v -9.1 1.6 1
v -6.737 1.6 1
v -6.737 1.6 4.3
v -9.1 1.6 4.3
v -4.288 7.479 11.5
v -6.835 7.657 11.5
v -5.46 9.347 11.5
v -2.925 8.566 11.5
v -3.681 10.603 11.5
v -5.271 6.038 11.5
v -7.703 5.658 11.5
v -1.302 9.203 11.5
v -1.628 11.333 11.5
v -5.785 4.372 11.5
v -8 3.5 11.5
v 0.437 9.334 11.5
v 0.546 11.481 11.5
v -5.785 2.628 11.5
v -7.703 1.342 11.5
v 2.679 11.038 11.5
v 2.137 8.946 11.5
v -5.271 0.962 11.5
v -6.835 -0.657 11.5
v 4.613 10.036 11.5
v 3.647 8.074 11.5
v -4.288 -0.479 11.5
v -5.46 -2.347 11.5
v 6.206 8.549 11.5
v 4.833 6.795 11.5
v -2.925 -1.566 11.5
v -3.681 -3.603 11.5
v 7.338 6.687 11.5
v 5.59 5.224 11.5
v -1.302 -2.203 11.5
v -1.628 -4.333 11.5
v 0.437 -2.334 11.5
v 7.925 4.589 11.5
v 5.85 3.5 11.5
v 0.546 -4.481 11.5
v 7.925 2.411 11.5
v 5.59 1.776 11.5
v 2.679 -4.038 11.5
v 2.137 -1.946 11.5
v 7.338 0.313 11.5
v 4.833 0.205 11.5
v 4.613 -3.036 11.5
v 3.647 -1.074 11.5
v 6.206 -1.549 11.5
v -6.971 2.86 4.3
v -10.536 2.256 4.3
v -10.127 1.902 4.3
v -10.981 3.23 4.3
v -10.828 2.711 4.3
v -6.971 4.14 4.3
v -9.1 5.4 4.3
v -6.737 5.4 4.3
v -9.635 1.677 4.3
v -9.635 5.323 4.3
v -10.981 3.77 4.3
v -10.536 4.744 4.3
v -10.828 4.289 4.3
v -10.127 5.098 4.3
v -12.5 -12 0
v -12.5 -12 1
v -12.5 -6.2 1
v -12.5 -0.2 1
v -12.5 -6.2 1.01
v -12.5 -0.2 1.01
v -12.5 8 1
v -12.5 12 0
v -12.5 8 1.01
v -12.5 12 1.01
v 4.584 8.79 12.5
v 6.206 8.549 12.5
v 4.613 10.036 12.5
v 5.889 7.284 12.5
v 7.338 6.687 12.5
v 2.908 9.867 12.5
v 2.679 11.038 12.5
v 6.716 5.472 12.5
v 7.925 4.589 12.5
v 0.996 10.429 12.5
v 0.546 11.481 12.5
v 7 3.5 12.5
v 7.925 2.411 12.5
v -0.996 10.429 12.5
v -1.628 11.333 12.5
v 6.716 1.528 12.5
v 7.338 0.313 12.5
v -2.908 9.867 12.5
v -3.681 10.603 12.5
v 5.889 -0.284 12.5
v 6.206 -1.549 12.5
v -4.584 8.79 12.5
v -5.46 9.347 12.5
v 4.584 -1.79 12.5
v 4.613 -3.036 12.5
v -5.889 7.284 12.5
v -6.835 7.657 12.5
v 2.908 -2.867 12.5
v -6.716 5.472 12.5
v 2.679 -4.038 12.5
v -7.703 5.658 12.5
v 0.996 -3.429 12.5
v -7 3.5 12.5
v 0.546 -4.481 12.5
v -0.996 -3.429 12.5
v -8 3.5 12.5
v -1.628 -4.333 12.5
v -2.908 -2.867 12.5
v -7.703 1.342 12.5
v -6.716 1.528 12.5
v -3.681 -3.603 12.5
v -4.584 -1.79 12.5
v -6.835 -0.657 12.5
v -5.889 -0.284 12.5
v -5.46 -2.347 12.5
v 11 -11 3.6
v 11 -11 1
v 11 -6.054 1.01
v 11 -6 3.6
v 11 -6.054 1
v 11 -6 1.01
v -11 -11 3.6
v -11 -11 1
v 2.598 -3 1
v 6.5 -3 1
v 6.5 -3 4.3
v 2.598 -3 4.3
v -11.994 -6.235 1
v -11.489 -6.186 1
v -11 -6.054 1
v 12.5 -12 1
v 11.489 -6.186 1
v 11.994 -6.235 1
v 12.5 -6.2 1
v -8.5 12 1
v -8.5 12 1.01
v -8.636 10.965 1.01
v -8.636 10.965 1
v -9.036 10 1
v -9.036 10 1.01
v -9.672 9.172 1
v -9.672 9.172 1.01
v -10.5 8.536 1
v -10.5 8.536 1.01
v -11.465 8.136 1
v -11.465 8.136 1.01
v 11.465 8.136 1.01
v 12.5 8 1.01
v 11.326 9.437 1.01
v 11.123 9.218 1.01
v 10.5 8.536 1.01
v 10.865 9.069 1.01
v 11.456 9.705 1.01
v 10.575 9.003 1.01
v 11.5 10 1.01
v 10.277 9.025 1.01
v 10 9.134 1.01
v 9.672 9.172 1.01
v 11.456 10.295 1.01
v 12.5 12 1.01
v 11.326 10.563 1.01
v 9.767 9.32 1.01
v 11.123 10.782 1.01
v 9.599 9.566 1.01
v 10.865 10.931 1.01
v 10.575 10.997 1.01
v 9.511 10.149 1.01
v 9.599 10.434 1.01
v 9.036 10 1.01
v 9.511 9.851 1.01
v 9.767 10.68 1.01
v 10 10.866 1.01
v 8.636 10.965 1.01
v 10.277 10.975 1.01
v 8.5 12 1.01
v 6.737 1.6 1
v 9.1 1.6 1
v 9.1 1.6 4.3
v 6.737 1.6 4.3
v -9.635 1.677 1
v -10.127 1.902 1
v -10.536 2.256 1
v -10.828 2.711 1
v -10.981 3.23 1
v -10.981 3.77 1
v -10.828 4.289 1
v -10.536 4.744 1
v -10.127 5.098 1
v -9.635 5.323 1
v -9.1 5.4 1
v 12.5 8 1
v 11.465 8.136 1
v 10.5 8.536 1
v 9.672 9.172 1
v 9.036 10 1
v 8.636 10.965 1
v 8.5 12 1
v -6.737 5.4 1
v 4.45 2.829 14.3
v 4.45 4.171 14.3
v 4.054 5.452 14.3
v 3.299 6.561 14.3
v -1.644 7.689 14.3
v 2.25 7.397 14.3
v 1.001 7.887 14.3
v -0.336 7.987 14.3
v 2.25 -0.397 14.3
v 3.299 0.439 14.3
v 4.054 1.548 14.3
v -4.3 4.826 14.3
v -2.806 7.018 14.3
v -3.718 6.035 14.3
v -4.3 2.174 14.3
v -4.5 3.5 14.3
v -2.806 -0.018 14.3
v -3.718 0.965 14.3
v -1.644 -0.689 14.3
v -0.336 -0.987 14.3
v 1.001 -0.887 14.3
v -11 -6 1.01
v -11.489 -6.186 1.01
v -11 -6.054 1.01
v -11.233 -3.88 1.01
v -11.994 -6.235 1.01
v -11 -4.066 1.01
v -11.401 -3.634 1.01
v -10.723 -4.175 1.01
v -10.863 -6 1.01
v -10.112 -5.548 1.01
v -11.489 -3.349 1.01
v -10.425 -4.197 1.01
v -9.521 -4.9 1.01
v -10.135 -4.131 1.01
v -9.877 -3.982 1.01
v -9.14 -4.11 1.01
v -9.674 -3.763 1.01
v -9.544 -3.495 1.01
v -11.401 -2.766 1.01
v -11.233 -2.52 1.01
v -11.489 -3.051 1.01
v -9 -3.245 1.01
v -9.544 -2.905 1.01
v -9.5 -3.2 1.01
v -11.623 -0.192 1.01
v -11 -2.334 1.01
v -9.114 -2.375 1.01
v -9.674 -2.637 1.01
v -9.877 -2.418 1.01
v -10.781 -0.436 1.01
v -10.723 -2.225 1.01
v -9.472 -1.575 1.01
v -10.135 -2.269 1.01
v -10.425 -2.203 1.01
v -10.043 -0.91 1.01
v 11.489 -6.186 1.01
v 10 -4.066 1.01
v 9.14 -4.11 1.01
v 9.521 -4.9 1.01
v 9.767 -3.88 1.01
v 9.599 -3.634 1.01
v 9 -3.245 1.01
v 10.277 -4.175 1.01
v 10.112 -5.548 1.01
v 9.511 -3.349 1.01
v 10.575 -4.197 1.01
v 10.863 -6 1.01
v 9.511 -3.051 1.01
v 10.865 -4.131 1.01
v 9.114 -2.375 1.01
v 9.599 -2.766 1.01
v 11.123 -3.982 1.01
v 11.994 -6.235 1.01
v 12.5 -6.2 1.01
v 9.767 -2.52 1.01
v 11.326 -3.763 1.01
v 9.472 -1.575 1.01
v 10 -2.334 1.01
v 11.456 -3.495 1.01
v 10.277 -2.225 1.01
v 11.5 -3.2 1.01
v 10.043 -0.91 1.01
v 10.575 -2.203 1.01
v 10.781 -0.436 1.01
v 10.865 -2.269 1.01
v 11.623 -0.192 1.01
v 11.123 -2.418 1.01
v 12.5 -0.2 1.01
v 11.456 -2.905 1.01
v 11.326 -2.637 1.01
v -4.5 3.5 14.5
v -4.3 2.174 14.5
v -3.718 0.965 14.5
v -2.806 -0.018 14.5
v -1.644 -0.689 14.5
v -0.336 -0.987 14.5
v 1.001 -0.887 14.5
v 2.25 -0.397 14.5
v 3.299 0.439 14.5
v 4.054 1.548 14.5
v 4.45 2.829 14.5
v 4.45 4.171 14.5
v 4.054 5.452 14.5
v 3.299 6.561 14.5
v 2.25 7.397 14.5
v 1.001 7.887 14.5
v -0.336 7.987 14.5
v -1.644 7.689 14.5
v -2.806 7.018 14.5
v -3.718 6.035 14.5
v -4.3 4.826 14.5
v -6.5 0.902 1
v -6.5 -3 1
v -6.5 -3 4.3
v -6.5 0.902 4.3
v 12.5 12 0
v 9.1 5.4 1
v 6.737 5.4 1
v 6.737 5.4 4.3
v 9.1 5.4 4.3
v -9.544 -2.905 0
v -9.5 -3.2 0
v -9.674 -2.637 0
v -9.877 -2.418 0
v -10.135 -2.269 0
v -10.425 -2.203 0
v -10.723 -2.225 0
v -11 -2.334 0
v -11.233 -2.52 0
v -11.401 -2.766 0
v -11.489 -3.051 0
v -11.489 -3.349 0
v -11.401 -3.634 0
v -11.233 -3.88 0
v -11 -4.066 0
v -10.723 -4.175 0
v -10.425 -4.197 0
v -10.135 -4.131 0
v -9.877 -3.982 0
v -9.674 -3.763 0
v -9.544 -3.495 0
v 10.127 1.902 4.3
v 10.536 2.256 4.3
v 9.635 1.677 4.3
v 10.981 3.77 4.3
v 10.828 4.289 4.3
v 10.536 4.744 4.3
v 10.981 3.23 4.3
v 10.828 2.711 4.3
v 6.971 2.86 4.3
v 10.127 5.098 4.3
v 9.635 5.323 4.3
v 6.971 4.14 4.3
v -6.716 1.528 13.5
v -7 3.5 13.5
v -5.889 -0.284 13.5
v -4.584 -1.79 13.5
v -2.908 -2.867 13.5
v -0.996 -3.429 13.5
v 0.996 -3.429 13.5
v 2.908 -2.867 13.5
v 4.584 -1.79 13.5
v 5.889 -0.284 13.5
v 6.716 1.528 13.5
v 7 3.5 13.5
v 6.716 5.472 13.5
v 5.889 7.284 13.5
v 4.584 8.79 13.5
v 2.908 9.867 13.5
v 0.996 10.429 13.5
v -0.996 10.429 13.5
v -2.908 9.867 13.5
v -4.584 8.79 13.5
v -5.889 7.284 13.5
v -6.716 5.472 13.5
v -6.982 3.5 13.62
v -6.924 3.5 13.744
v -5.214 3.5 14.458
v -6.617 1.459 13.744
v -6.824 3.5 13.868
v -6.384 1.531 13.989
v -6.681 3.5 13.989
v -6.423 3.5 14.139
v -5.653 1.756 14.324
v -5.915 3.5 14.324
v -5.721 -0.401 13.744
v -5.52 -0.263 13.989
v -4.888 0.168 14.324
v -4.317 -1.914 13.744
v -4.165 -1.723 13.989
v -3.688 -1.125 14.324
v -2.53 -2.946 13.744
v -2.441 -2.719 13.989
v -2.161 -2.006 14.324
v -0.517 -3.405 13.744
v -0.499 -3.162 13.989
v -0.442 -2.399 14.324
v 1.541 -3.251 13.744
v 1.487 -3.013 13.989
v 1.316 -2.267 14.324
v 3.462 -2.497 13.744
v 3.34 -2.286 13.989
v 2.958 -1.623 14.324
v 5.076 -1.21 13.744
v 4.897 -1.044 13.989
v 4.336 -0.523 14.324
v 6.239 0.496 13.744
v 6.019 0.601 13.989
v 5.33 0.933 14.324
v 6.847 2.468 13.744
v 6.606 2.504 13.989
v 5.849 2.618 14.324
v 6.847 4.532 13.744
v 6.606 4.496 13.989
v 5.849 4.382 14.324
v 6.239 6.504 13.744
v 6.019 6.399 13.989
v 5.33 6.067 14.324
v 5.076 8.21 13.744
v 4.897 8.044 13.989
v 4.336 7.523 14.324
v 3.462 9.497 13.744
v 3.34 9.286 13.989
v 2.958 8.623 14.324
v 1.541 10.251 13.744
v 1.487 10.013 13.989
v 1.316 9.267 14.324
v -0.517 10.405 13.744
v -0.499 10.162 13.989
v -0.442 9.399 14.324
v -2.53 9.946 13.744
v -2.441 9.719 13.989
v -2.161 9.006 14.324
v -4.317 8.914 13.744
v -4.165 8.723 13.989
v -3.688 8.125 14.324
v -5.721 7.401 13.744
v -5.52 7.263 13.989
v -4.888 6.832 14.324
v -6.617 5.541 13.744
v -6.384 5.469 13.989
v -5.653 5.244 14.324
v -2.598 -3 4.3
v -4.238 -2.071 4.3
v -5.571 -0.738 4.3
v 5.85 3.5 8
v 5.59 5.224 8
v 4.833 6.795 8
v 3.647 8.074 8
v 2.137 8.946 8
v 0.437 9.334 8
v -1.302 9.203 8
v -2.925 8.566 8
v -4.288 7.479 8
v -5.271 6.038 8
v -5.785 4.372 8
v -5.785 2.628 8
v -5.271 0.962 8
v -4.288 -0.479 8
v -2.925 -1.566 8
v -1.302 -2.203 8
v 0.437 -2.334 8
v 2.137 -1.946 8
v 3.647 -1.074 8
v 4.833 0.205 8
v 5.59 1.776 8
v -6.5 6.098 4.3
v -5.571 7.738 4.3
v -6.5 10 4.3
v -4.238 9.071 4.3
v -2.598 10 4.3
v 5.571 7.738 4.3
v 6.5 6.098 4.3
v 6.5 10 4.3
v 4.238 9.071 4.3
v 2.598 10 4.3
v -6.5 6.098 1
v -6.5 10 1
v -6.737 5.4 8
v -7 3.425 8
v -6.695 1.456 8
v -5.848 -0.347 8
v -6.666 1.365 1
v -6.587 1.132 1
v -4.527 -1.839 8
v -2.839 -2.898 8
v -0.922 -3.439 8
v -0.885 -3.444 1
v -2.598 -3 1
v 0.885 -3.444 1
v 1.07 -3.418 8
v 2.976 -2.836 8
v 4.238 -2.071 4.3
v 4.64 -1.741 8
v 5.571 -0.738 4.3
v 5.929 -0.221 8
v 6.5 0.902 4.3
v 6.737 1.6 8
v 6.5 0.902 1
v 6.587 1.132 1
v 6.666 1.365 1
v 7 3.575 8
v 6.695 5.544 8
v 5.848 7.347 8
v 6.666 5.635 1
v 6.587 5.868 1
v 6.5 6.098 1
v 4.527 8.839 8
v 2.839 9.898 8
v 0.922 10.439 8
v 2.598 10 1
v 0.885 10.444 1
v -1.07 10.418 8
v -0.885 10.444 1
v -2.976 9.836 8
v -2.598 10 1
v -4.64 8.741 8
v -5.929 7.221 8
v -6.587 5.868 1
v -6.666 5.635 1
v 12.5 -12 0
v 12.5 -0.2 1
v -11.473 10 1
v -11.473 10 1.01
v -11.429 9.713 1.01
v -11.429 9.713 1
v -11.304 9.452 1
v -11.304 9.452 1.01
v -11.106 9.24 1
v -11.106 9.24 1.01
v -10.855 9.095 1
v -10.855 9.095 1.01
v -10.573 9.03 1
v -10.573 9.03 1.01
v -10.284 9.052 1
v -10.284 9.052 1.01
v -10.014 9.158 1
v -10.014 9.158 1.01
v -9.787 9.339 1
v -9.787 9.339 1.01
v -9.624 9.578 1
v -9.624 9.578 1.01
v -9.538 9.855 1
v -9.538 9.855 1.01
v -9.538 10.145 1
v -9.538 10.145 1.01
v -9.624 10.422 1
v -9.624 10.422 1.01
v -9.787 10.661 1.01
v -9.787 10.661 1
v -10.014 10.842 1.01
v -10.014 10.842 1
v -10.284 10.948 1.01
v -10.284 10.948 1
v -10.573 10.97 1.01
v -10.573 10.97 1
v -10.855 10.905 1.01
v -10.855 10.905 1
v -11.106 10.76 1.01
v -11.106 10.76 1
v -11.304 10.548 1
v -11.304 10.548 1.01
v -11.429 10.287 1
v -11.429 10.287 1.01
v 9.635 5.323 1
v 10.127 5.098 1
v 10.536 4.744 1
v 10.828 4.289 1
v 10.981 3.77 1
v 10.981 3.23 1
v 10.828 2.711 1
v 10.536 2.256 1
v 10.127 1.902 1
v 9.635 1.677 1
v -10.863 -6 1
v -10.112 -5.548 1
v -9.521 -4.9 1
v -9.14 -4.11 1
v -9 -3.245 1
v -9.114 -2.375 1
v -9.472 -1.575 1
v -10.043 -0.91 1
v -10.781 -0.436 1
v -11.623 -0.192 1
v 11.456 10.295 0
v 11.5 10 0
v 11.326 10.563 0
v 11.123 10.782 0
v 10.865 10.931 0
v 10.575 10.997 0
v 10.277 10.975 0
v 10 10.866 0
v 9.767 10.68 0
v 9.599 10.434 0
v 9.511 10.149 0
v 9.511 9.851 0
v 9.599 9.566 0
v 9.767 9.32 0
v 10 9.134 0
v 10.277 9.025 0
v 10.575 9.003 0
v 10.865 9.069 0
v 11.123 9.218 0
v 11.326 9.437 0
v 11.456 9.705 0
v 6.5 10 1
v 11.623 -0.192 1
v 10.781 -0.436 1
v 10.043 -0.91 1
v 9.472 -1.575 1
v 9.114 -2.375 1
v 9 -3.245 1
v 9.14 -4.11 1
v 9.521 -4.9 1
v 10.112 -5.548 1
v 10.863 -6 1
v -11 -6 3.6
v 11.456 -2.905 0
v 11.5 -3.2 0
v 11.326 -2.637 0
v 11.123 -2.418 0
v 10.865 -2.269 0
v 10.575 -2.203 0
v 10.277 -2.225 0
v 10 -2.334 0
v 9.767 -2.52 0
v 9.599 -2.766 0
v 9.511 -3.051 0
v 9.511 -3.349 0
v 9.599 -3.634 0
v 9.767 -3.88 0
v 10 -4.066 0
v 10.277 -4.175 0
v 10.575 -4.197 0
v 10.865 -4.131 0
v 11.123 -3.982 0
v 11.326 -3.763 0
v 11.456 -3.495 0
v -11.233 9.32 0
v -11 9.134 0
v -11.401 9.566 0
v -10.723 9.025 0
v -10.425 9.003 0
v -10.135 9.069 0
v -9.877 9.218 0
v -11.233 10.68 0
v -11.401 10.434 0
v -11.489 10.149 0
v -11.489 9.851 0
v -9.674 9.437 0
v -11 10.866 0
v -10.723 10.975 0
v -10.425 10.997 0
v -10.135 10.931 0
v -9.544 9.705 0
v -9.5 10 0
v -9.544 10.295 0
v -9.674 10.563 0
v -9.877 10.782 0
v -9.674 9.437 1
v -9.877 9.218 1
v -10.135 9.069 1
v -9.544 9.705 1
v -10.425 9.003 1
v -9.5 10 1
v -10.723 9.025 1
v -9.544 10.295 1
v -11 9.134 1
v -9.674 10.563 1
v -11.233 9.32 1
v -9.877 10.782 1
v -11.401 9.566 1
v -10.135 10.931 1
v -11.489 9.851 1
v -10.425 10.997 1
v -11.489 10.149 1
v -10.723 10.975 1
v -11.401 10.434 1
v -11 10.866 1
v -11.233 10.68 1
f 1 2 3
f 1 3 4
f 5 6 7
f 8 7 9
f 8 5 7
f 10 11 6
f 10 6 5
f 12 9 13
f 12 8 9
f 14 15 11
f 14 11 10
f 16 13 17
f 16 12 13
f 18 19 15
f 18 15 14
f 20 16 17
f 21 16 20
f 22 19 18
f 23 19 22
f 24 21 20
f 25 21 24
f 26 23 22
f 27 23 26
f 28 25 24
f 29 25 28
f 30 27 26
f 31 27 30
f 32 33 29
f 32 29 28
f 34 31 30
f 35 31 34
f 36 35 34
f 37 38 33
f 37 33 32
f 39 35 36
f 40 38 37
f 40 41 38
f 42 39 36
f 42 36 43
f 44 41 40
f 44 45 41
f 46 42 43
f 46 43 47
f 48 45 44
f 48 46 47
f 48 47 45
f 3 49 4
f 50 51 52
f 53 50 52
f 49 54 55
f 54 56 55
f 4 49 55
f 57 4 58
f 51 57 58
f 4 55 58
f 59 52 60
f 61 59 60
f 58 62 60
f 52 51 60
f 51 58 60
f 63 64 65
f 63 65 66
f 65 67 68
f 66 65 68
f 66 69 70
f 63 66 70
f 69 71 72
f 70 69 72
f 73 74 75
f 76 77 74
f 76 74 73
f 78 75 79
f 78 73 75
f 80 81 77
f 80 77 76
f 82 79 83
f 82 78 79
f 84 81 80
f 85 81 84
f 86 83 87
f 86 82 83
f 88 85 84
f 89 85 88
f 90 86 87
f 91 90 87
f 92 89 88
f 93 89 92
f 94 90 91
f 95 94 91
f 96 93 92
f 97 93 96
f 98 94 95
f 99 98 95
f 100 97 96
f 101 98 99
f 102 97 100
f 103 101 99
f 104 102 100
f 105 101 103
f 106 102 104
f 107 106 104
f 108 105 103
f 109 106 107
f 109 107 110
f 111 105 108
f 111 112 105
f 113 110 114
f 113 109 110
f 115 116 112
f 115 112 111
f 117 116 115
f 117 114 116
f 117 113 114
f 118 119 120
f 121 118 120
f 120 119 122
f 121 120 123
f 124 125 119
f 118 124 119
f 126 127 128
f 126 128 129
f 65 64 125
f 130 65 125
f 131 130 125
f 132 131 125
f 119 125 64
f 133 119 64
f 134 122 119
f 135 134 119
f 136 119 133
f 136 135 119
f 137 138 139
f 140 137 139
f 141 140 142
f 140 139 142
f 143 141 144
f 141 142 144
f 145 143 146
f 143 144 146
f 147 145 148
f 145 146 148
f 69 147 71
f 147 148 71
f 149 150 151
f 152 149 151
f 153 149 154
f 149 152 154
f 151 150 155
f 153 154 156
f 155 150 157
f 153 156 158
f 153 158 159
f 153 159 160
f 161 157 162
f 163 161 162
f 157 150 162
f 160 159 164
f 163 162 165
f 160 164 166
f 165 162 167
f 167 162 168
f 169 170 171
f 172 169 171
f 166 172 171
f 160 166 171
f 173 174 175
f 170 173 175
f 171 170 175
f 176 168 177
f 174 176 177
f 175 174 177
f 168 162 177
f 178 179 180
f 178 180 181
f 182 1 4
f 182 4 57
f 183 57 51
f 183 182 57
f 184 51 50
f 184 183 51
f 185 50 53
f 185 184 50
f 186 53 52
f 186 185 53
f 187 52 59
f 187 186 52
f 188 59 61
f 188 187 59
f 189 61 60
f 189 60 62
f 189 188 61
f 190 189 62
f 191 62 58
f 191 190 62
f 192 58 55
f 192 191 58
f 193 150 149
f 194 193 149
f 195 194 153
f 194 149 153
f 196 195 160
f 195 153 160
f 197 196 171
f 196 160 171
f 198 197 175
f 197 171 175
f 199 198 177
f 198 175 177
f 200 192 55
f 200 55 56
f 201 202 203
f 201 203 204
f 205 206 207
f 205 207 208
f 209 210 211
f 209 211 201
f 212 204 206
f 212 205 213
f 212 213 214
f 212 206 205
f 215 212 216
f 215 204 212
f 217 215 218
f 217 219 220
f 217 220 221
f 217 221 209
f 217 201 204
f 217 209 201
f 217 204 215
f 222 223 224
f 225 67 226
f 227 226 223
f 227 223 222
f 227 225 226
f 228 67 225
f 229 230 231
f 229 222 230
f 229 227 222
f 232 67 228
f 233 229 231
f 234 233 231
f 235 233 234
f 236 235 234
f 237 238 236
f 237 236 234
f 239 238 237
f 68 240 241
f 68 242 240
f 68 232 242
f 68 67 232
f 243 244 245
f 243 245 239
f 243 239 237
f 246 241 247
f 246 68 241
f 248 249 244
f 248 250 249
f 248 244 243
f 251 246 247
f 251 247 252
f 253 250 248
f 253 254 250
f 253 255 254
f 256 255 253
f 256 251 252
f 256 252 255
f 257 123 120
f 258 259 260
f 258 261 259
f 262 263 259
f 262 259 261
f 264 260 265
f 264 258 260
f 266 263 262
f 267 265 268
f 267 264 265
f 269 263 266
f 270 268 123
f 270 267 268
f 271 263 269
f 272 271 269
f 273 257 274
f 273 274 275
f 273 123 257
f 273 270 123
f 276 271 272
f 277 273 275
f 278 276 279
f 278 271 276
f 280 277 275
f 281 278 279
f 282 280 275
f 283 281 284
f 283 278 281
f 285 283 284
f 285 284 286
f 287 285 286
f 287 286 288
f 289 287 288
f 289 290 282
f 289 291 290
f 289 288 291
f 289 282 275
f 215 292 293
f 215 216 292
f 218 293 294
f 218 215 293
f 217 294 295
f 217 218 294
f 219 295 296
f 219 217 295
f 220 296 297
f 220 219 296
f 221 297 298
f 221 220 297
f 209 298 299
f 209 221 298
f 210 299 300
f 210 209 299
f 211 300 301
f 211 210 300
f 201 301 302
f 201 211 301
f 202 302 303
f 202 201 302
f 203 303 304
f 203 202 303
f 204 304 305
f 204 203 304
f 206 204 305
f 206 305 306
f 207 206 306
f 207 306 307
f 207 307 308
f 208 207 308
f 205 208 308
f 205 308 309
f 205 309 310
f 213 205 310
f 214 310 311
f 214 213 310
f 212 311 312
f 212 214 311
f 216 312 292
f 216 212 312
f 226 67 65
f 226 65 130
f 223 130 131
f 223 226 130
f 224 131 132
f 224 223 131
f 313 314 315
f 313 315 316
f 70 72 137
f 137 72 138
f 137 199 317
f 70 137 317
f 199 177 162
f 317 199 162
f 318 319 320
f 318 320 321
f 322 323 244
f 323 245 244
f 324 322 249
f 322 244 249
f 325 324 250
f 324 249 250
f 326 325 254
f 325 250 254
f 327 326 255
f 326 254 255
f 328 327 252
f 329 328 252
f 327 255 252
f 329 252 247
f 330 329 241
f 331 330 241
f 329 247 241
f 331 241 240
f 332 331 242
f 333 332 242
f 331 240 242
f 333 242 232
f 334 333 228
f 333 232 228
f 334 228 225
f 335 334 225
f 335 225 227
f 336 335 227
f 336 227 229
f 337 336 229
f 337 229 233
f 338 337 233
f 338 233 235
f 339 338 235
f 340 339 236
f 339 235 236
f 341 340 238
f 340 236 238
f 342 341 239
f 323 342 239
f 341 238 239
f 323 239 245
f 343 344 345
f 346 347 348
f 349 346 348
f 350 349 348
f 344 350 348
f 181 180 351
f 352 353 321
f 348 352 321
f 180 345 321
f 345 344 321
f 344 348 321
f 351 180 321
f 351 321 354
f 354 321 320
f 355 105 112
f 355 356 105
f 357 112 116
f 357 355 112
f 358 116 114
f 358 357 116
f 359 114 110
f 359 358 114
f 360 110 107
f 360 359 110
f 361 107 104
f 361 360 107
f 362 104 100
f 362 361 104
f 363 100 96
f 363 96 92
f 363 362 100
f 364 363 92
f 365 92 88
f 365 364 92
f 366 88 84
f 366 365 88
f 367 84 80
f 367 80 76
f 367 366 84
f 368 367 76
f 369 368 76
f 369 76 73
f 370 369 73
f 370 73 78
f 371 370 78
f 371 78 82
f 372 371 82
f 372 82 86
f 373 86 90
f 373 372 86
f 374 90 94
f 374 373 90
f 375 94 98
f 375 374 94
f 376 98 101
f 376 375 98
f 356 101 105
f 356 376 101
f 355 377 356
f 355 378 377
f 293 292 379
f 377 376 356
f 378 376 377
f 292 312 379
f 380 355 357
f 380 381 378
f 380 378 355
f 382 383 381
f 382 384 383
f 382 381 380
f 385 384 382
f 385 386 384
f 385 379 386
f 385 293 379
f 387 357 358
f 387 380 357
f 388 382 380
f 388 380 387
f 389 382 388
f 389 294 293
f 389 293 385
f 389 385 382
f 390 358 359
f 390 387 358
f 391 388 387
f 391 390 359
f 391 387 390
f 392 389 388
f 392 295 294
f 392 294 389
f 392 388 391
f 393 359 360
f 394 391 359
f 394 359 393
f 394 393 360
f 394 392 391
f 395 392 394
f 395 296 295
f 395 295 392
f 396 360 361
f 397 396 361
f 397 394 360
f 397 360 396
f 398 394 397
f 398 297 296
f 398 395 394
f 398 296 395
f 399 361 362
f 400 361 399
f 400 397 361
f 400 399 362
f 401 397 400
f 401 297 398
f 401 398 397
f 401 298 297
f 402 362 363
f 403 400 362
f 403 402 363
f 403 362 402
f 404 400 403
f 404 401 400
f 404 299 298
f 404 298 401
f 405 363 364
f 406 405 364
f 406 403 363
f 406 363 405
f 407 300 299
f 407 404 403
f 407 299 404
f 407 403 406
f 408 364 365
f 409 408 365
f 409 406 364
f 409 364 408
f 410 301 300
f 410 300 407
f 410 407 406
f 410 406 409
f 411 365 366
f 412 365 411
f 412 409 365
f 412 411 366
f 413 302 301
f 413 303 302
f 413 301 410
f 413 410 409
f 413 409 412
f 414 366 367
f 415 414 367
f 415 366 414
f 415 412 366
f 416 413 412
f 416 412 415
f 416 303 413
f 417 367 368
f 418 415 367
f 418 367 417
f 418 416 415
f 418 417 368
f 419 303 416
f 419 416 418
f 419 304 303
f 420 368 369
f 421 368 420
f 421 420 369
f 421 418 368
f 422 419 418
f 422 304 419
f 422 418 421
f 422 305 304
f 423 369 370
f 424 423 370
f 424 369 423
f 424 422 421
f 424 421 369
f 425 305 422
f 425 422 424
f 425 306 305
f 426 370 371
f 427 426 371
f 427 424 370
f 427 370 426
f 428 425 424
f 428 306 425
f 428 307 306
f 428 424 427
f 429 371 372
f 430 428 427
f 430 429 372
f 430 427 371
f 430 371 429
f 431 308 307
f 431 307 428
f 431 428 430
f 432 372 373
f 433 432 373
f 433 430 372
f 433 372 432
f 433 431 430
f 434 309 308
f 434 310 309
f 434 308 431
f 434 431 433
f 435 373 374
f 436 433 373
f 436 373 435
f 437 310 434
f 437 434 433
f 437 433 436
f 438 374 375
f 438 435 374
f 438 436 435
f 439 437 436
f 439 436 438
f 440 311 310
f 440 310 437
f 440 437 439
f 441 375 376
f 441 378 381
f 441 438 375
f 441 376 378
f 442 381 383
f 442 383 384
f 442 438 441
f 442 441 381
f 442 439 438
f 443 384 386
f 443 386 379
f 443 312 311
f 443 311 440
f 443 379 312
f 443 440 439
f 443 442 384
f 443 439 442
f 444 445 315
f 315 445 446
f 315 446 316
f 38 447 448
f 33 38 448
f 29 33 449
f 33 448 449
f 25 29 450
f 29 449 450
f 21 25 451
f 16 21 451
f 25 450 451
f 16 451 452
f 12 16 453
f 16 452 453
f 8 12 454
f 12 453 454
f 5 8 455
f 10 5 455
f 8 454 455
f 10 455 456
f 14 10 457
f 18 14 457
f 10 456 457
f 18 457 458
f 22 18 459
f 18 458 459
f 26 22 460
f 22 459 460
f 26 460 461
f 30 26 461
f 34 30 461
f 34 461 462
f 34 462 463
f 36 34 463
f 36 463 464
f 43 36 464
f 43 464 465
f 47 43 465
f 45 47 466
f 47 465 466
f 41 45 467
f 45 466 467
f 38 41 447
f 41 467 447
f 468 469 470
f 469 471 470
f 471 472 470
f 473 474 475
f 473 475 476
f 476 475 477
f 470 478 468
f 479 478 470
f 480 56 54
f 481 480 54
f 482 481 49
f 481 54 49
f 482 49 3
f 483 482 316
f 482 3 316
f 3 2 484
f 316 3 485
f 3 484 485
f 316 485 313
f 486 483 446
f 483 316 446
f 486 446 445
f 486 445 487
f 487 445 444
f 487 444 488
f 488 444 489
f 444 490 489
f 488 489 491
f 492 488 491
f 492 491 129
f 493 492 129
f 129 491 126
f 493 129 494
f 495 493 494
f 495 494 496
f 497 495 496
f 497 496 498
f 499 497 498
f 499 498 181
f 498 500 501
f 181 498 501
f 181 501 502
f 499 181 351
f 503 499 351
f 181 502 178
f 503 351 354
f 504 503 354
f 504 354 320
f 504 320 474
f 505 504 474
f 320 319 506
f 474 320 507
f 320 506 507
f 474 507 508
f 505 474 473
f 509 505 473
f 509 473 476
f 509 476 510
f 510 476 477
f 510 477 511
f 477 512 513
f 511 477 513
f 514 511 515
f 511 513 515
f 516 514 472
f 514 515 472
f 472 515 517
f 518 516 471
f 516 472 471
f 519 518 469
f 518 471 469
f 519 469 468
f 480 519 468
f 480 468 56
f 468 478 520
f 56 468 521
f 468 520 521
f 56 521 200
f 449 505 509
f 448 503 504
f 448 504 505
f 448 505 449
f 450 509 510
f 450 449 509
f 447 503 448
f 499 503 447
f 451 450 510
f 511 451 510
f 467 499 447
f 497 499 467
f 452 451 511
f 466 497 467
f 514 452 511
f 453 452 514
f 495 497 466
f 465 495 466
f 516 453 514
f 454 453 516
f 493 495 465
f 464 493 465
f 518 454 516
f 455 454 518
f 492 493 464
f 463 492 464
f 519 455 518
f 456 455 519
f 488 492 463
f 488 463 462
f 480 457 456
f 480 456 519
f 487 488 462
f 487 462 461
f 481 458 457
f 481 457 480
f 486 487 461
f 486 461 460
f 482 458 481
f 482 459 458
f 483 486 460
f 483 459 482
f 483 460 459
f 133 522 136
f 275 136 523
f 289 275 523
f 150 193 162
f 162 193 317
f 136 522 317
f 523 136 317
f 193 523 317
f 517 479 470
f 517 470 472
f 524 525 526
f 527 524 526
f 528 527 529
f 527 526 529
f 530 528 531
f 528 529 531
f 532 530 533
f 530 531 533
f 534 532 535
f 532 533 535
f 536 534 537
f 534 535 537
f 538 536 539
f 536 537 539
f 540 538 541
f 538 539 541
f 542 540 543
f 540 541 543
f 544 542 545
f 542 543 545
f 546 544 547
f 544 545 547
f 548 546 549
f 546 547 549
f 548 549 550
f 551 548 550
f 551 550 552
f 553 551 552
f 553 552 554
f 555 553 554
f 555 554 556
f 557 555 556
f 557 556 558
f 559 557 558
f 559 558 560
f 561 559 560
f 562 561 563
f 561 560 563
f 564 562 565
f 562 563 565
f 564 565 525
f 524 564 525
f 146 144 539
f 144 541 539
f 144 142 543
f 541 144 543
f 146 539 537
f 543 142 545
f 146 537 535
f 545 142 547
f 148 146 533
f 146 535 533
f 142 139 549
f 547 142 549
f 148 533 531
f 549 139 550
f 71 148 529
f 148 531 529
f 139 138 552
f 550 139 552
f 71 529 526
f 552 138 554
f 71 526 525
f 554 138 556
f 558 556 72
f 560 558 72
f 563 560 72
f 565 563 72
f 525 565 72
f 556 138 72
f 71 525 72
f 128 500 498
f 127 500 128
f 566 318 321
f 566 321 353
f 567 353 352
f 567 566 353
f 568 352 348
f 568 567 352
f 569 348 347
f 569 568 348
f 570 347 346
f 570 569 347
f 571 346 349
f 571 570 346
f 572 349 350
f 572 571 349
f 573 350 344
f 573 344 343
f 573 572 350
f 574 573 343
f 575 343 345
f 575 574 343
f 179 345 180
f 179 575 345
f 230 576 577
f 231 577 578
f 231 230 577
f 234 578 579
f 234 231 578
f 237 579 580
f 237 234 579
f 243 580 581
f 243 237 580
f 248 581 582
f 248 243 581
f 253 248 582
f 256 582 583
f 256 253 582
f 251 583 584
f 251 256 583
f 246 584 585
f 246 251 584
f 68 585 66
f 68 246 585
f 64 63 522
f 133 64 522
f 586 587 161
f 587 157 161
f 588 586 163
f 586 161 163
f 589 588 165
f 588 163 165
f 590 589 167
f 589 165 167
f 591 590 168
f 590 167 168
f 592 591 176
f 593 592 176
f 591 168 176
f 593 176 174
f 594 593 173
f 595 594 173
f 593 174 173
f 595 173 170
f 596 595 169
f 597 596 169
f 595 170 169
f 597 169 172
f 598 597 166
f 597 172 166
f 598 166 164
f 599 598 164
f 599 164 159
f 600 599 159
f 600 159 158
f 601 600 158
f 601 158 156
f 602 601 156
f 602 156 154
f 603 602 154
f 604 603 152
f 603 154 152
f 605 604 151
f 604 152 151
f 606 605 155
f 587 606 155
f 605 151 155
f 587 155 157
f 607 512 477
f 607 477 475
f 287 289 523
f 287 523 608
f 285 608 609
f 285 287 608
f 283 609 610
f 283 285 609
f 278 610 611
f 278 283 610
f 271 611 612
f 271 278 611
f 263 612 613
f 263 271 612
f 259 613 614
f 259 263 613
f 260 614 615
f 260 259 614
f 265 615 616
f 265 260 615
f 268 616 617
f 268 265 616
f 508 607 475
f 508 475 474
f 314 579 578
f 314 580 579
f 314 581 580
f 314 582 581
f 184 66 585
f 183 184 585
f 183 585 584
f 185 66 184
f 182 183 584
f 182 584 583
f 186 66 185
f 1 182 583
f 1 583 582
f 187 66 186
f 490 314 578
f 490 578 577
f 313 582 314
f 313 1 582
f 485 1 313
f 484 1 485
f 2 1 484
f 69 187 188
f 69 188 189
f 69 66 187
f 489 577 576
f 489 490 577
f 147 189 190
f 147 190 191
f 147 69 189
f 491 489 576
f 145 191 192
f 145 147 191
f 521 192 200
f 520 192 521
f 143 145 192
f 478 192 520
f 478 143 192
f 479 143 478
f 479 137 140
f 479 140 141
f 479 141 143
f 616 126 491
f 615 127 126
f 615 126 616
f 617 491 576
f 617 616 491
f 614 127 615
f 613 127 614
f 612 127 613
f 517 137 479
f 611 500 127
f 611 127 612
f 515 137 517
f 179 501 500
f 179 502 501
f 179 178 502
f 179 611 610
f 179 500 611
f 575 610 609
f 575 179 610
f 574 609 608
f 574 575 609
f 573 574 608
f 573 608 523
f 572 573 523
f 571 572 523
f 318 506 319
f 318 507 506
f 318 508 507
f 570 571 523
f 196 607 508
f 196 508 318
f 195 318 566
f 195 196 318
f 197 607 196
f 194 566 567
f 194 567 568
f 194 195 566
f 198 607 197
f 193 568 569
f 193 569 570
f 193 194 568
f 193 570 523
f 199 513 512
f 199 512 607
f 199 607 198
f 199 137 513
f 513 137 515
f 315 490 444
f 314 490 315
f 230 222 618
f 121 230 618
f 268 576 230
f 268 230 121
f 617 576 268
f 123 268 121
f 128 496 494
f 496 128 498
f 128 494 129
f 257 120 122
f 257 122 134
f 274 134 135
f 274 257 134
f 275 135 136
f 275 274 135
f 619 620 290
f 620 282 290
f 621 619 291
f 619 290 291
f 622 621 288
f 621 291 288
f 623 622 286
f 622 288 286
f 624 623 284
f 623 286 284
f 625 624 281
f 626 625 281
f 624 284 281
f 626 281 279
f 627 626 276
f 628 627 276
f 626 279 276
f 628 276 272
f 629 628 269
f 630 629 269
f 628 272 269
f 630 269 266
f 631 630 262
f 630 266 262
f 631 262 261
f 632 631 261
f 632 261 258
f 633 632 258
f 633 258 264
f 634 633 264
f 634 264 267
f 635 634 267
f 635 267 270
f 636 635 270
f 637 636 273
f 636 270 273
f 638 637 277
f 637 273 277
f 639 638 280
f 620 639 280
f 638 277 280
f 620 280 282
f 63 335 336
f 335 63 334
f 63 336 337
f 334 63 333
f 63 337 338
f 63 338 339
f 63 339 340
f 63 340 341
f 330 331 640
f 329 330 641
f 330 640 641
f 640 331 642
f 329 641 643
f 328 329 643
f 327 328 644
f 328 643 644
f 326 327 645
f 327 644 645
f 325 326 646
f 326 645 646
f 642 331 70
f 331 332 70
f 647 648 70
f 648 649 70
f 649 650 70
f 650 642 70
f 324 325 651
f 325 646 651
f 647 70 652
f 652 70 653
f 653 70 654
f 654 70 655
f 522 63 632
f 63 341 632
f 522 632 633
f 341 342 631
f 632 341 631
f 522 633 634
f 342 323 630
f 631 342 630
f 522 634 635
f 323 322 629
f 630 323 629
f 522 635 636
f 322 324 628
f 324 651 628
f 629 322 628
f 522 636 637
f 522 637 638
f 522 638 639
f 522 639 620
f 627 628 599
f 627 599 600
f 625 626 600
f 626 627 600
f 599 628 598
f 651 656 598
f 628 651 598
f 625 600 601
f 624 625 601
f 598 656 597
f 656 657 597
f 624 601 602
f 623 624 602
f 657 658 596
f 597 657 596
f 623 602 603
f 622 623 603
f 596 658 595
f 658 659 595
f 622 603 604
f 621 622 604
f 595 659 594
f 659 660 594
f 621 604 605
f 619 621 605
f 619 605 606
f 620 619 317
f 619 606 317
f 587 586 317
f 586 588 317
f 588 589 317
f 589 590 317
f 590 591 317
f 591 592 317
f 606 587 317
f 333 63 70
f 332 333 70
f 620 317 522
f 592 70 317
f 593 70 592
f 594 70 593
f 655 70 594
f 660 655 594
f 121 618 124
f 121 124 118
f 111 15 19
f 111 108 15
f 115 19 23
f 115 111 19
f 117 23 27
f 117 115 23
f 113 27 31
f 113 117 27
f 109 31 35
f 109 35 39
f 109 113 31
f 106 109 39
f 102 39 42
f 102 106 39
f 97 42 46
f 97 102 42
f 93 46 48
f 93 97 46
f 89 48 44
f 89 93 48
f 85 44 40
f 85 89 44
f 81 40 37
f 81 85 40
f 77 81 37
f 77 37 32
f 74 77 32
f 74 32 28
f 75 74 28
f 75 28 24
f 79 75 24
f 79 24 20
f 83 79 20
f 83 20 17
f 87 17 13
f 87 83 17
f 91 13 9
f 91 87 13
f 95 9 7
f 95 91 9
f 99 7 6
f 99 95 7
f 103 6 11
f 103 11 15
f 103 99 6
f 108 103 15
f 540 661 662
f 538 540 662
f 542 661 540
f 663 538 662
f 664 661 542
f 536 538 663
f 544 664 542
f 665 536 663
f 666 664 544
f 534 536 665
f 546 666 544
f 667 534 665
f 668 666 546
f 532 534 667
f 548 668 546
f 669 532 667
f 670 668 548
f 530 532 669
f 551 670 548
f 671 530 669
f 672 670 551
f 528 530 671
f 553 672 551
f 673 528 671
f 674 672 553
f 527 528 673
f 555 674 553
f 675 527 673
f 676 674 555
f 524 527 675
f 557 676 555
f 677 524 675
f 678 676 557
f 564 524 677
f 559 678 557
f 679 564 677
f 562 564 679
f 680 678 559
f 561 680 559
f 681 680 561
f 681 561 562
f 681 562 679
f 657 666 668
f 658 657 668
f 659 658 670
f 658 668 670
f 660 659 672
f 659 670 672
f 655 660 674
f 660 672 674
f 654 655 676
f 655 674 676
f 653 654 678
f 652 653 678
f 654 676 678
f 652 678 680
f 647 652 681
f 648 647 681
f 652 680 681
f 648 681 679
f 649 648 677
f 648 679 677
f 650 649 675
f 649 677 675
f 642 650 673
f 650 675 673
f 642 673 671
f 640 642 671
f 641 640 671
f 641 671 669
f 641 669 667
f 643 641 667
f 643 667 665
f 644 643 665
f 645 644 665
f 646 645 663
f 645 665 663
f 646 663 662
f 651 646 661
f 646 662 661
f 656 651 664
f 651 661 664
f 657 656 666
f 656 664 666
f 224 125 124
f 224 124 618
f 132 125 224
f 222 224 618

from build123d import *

# Parameters (mm, degrees)
CROQUIS1_W              = 25
CROQUIS1_H              = 24
SALIENTE_EXTRUIR1_DEPTH = 1
CROQUIS2_W              = 22
CROQUIS2_H              = 5
SALIENTE_EXTRUIR2_DEPTH = 2.6
SALIENTE_EXTRUIR3_DEPTH = 3.3
CROQUIS5_R              = 7
SALIENTE_EXTRUIR4_DEPTH = 7
CROQUIS6_R              = 5.85
SALIENTE_EXTRUIR5_DEPTH = 3.5
CROQUIS9_R              = 1
CORTAR_EXTRUIR1_DEPTH   = 1
SALIENTE_EXTRUIR6_START = 0.01
CROQUIS10_R             = 0.972515087
CROQUIS10_R_2           = 1
SALIENTE_EXTRUIR6_DEPTH = 0.01


with BuildPart() as part:
    # Croquis1 → Saliente-Extruir1 (new body)
    with BuildSketch(Plane.XY):
        Rectangle(CROQUIS1_W, CROQUIS1_H)
    extrude(amount=SALIENTE_EXTRUIR1_DEPTH)

    # Croquis2 → Saliente-Extruir2 (add)
    with BuildSketch(Plane.XY.offset(1)):
        with Locations((0, -8.5)):
            Rectangle(CROQUIS2_W, CROQUIS2_H)
    extrude(amount=SALIENTE_EXTRUIR2_DEPTH)

    # Croquis3 → Saliente-Extruir3 (add)
    with BuildSketch(Plane.XY.offset(1)):
        with BuildLine():
            Line((-9.1, 5.4), (-6.5, 5.4))
            Line((-6.5, 5.4), (-6.5, 10))
            Line((-6.5, 10), (6.5, 10))
            Line((6.5, 10), (6.5, 5.4))
            Line((6.5, 5.4), (9.1, 5.4))
            ThreePointArc((9.1, 5.4), (11, 3.5), (9.1, 1.6))
            Line((9.1, 1.6), (6.5, 1.6))
            Line((6.5, 1.6), (6.5, -3))
            Line((6.5, -3), (-6.5, -3))
            Line((-6.5, -3), (-6.5, 1.6))
            Line((-6.5, 1.6), (-9.1, 1.6))
            ThreePointArc((-9.1, 1.6), (-11, 3.5), (-9.1, 5.4))
        make_face()
    extrude(amount=SALIENTE_EXTRUIR3_DEPTH)

    # Croquis5 → Saliente-Extruir4 (add)
    with BuildSketch(Plane.XY.offset(1)):
        with Locations(Location((0, 3.5, 0), (0, 0, 164.250707132))):
            Circle(CROQUIS5_R)
    extrude(amount=SALIENTE_EXTRUIR4_DEPTH)

    # Croquis6 → Saliente-Extruir5 (add)
    with BuildSketch(Plane.XY.offset(8)):
        with Locations((0, 3.5)):
            Circle(CROQUIS6_R)
    extrude(amount=SALIENTE_EXTRUIR5_DEPTH)

    # Croquis8 → Revolución1 (revolve)
    with BuildSketch(Plane(origin=(0, 3.5, 0), x_dir=(-1, 0, 0), z_dir=(0, -1, 0)), mode=Mode.PRIVATE) as revoluci_n1_sk:
        with BuildLine():
            Line((0, -11.5), (-8, -11.5))
            Line((-8, -11.5), (-8, -12.5))
            Line((-8, -12.5), (-7, -12.5))
            Line((-7, -12.5), (-7, -13.5))
            add(Edge.make_bspline(
                [(-7, -13.5), (-7, -14.5), (-4.5, -14.5)],
                knots=[0, 0, 0, 1.570796327, 1.570796327, 1.570796327], degree=2, weights=[1, 0.707106781, 1]))
            Line((-4.5, -14.5), (-4.5, -14.3))
            Line((-4.5, -14.3), (0, -14.3))
            Line((0, -14.3), (0, -11.5))
        make_face()
    revolve(revoluci_n1_sk.sketch.rotate(Axis((0, 3.5, 11.5), (0, 0, 1)), 180), axis=Axis((0, 3.5, 11.5), (0, 0, 1)))

    # Croquis9 → Cortar-Extruir1 (cut)
    with BuildSketch(Plane.XY.offset(1)):
        with Locations((-10.5, 10)):
            Circle(CROQUIS9_R)
        with Locations((-10.5, -3.2)):
            Circle(CROQUIS9_R)
        with Locations((10.5, -3.2)):
            Circle(CROQUIS9_R)
        with Locations((10.5, 10)):
            Circle(CROQUIS9_R)
    extrude(amount=-CORTAR_EXTRUIR1_DEPTH, mode=Mode.SUBTRACT)

    # Croquis10 → Saliente-Extruir6 (add)
    # profile 1 of 4: a face of its own
    with BuildSketch(Plane.XY.offset(1).offset(SALIENTE_EXTRUIR6_START)):
        with BuildLine():
            Line((-12.5, 8), (-12.5, 12))
            Line((-12.5, 12), (-8.5, 12))
            ThreePointArc((-8.5, 12), (-9.671572875, 9.171572875), (-12.5, 8))
        make_face()
        with Locations(Location((-10.5, 10, 0), (0, 0, 180))):
            Circle(CROQUIS10_R, mode=Mode.SUBTRACT)
    # profile 2 of 4: a face of its own
    with BuildSketch(Plane.XY.offset(1).offset(SALIENTE_EXTRUIR6_START)):
        with BuildLine():
            Line((-12.5, -0.2), (-12.5, -6.2))
            ThreePointArc((-12.5, -6.2), (-9, -3.2), (-12.5, -0.2))
        make_face()
        with Locations((-10.5, -3.2)):
            Circle(CROQUIS10_R_2, mode=Mode.SUBTRACT)
    # profile 3 of 4: a face of its own
    with BuildSketch(Plane.XY.offset(1).offset(SALIENTE_EXTRUIR6_START)):
        with BuildLine():
            Line((8.5, 12), (12.5, 12))
            Line((12.5, 12), (12.5, 8))
            ThreePointArc((12.5, 8), (9.671572875, 9.171572875), (8.5, 12))
        make_face()
        with Locations((10.5, 10)):
            Circle(CROQUIS10_R_2, mode=Mode.SUBTRACT)
    # profile 4 of 4: a face of its own
    with BuildSketch(Plane.XY.offset(1).offset(SALIENTE_EXTRUIR6_START)):
        with BuildLine():
            Line((12.5, -6.2), (12.5, -0.2))
            ThreePointArc((12.5, -0.2), (9, -3.2), (12.5, -6.2))
        make_face()
        with Locations((10.5, -3.2)):
            Circle(CROQUIS10_R_2, mode=Mode.SUBTRACT)
    extrude(amount=-SALIENTE_EXTRUIR6_DEPTH)


solid = part.part
